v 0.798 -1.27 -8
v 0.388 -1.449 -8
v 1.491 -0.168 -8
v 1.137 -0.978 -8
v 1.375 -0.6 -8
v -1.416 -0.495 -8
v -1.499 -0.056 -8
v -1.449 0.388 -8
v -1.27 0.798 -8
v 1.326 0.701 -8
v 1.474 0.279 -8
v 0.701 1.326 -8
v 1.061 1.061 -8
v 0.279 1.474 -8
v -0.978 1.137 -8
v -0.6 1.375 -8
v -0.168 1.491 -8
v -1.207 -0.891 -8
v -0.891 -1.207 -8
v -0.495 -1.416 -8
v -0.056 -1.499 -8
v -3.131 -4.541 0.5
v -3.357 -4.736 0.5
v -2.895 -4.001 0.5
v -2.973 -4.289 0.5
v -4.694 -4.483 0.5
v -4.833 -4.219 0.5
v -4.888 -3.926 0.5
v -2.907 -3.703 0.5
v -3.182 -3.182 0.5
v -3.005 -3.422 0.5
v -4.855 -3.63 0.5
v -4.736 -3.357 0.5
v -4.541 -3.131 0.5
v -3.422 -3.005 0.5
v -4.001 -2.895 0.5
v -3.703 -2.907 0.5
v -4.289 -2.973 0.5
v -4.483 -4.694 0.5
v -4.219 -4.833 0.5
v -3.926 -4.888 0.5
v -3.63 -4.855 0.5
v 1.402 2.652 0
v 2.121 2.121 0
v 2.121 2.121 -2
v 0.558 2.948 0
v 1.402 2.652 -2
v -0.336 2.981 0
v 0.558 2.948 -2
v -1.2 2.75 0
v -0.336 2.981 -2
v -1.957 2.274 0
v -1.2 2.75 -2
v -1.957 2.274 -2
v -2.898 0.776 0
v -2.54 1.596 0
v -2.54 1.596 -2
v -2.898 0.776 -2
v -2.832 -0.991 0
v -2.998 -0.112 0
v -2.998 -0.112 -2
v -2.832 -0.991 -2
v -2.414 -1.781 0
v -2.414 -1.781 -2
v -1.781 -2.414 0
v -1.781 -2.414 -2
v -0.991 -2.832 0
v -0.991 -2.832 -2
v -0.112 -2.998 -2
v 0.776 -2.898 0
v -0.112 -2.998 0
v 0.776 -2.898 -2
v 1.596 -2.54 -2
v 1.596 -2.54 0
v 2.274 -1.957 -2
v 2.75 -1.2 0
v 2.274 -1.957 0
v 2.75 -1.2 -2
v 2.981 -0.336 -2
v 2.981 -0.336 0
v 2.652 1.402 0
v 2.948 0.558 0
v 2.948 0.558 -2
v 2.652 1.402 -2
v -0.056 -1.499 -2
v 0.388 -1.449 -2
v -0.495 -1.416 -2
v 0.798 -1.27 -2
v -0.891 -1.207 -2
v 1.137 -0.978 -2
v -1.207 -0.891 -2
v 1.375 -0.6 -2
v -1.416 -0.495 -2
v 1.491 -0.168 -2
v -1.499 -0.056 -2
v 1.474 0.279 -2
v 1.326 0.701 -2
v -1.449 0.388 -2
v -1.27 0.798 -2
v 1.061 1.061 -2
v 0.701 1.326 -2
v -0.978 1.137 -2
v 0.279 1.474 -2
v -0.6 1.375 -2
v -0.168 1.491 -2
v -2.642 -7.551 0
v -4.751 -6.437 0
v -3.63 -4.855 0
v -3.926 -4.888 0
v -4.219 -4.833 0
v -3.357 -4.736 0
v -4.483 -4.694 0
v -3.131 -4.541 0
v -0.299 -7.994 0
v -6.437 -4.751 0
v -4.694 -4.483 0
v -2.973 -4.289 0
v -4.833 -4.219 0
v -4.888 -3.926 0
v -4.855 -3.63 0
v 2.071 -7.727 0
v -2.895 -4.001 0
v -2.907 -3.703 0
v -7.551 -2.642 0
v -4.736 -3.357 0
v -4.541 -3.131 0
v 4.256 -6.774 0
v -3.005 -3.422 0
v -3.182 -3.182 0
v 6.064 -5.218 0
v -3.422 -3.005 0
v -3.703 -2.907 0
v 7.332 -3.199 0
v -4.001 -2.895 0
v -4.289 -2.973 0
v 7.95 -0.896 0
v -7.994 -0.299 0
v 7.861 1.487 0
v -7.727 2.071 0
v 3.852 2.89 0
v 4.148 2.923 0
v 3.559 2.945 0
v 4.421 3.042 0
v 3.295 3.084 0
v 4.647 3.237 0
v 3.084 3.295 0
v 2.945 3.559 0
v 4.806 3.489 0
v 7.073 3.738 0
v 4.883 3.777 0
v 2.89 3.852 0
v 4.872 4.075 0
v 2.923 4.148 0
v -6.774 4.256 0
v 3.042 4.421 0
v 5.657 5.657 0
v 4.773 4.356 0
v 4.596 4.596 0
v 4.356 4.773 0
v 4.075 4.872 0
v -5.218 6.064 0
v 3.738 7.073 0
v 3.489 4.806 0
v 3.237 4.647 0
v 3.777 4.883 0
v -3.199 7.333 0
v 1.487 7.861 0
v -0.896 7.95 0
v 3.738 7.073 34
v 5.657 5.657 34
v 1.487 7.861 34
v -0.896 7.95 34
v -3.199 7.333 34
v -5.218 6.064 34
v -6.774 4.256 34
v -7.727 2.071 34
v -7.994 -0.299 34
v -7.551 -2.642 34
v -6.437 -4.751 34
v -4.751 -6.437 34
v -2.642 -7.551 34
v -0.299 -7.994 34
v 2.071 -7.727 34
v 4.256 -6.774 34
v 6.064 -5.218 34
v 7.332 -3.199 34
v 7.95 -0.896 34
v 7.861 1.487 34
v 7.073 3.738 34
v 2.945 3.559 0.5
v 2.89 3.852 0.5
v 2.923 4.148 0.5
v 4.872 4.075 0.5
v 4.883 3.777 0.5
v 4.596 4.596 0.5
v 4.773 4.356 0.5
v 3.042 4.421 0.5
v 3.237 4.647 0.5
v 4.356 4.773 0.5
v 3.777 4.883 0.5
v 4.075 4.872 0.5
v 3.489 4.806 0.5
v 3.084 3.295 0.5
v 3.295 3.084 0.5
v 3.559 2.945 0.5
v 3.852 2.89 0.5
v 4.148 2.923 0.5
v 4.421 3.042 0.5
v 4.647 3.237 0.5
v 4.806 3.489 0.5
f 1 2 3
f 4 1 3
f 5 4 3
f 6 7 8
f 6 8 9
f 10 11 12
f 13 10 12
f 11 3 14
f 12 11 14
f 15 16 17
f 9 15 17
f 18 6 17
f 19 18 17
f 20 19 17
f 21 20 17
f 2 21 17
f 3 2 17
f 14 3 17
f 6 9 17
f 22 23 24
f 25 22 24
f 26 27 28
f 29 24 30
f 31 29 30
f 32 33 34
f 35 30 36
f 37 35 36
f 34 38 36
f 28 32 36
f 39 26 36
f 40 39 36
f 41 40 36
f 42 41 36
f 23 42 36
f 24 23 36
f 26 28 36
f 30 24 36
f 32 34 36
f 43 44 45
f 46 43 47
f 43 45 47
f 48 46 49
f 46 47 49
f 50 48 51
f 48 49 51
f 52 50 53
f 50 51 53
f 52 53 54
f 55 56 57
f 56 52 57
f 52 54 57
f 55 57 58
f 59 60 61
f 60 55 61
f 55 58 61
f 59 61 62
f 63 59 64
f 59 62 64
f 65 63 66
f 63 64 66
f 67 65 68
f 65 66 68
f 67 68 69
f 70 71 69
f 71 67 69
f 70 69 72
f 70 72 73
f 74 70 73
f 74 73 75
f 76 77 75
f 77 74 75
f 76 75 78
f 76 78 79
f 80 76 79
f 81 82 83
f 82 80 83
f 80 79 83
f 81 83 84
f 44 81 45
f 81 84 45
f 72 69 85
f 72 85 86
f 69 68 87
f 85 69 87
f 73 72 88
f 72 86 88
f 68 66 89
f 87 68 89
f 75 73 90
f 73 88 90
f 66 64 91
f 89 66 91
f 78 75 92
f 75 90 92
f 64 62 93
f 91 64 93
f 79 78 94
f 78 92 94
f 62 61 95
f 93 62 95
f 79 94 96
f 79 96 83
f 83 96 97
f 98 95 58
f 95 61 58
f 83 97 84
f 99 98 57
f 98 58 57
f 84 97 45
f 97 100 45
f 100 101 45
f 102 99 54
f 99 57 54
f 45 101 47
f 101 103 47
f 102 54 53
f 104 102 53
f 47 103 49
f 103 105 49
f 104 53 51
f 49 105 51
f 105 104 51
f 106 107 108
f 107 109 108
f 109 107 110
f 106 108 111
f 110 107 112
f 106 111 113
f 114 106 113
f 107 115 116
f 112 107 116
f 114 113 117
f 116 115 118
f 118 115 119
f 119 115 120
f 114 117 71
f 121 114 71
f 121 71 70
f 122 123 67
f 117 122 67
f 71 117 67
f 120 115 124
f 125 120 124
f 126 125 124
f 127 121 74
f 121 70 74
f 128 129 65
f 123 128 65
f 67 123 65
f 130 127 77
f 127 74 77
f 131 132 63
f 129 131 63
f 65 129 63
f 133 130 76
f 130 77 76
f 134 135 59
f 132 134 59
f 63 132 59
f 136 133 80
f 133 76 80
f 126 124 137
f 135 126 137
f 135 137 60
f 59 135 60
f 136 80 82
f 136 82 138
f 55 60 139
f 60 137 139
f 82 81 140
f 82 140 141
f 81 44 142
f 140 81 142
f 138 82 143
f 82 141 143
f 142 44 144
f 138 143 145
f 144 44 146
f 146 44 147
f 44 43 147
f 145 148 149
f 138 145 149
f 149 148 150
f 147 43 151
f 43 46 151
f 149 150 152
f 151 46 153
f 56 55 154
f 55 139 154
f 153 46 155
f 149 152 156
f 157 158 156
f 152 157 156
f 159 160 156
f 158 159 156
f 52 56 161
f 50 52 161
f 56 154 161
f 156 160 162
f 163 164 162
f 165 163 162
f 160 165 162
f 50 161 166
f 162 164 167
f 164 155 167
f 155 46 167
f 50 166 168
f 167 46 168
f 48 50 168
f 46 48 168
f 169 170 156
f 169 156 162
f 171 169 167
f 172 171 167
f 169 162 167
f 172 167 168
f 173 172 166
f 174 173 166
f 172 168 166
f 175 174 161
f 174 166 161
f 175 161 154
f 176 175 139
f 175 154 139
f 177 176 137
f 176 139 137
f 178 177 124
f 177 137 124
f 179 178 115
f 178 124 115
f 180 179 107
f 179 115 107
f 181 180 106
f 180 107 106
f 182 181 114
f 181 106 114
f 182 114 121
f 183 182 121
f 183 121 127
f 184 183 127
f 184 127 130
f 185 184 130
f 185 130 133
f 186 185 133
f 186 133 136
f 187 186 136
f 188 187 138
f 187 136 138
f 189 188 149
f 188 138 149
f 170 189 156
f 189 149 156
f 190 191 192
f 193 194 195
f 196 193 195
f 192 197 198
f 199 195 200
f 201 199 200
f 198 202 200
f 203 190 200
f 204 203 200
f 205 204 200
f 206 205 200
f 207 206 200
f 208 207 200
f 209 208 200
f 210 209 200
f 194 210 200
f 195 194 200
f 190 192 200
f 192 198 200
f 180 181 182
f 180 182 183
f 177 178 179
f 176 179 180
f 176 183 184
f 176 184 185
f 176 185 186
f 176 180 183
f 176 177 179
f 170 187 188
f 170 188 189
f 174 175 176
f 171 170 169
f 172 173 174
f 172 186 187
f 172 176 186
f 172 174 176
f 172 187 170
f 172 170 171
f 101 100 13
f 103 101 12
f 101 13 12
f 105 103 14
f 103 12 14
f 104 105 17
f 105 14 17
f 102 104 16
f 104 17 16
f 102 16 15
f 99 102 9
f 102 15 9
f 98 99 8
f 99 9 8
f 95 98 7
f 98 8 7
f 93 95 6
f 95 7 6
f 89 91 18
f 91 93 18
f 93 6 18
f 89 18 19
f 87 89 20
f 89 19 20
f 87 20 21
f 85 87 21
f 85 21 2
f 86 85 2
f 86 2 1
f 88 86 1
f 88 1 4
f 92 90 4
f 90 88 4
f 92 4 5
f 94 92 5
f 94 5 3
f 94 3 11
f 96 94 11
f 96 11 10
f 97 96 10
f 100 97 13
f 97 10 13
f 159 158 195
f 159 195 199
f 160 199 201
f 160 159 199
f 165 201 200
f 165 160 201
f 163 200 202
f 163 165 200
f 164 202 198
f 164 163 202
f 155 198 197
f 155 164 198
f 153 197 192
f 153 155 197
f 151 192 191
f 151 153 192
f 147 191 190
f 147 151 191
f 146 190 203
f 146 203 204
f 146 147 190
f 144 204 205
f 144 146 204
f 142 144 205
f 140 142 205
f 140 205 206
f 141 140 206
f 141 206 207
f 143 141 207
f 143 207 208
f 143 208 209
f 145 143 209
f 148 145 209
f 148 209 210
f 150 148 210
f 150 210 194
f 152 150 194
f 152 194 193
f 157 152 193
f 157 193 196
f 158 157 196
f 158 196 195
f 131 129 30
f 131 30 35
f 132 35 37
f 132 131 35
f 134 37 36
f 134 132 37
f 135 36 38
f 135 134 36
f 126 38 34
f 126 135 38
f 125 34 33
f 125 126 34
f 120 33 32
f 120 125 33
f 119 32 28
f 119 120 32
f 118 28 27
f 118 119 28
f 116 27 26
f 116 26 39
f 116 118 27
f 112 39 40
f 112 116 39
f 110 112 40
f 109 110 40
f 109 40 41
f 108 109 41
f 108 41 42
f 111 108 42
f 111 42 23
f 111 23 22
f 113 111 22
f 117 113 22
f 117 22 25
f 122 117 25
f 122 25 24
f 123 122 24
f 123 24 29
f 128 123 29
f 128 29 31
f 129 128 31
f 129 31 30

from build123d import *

# Parameters (mm, degrees)
CYLINDER002_R          = 3
CYLINDER002_DEPTH      = 2.5
CYLINDER004_R          = 1
CYLINDER004_DEPTH      = 8.5
CYLINDER003_R          = 1
CYLINDER003_DEPTH      = 8.5
CYLINDER_R             = 8
CYLINDER_DEPTH         = 34
CYLINDER001_R          = 1.5
CYLINDER001_DEPTH      = 8
FUSION_PLACEMENT_ANGLE = 44.999934


with BuildPart() as bearing:
    # Cylinder002 → Cylinder002 (new body)
    with BuildSketch(Plane.XY.offset(-2)):
        Circle(CYLINDER002_R)
    extrude(amount=CYLINDER002_DEPTH)


with BuildPart() as cylinder004:
    # Cylinder004 → Cylinder004 (new body)
    with BuildSketch(Plane(origin=(-5.5, 0, -8), x_dir=(1, 0, 0), z_dir=(0, 0, 1))):
        Circle(CYLINDER004_R)
    extrude(amount=CYLINDER004_DEPTH)


with BuildPart() as cylinder003:
    # Cylinder003 → Cylinder003 (new body)
    with BuildSketch(Plane(origin=(5.5, 0, -8), x_dir=(1, 0, 0), z_dir=(0, 0, 1))):
        Circle(CYLINDER003_R)
    extrude(amount=CYLINDER003_DEPTH)


with BuildPart() as cut001:
    # Cylinder → Cylinder (new body)
    with BuildSketch(Plane.XY):
        Circle(CYLINDER_R)
    extrude(amount=CYLINDER_DEPTH)

    # Cut: cut Cylinder003
    add(cylinder003.part, mode=Mode.SUBTRACT)

    # Cut001: cut Cylinder004
    add(cylinder004.part, mode=Mode.SUBTRACT)


with BuildPart() as f_16mmgearmotor:
    # Cylinder001 → Cylinder001 (new body)
    with BuildSketch(Plane.XY.offset(-8)):
        Circle(CYLINDER001_R)
    extrude(amount=CYLINDER001_DEPTH)

    # Fusion: union bearing, Cut001
    add(bearing.part)
    add(cut001.part)


with BuildPart() as f_16mmgearmotor_1:
    # Fusion placement: moved
    add(f_16mmgearmotor.part.rotate(Axis((0, 0, 0), (0, 0, 1)), FUSION_PLACEMENT_ANGLE))


solid = f_16mmgearmotor_1.part
